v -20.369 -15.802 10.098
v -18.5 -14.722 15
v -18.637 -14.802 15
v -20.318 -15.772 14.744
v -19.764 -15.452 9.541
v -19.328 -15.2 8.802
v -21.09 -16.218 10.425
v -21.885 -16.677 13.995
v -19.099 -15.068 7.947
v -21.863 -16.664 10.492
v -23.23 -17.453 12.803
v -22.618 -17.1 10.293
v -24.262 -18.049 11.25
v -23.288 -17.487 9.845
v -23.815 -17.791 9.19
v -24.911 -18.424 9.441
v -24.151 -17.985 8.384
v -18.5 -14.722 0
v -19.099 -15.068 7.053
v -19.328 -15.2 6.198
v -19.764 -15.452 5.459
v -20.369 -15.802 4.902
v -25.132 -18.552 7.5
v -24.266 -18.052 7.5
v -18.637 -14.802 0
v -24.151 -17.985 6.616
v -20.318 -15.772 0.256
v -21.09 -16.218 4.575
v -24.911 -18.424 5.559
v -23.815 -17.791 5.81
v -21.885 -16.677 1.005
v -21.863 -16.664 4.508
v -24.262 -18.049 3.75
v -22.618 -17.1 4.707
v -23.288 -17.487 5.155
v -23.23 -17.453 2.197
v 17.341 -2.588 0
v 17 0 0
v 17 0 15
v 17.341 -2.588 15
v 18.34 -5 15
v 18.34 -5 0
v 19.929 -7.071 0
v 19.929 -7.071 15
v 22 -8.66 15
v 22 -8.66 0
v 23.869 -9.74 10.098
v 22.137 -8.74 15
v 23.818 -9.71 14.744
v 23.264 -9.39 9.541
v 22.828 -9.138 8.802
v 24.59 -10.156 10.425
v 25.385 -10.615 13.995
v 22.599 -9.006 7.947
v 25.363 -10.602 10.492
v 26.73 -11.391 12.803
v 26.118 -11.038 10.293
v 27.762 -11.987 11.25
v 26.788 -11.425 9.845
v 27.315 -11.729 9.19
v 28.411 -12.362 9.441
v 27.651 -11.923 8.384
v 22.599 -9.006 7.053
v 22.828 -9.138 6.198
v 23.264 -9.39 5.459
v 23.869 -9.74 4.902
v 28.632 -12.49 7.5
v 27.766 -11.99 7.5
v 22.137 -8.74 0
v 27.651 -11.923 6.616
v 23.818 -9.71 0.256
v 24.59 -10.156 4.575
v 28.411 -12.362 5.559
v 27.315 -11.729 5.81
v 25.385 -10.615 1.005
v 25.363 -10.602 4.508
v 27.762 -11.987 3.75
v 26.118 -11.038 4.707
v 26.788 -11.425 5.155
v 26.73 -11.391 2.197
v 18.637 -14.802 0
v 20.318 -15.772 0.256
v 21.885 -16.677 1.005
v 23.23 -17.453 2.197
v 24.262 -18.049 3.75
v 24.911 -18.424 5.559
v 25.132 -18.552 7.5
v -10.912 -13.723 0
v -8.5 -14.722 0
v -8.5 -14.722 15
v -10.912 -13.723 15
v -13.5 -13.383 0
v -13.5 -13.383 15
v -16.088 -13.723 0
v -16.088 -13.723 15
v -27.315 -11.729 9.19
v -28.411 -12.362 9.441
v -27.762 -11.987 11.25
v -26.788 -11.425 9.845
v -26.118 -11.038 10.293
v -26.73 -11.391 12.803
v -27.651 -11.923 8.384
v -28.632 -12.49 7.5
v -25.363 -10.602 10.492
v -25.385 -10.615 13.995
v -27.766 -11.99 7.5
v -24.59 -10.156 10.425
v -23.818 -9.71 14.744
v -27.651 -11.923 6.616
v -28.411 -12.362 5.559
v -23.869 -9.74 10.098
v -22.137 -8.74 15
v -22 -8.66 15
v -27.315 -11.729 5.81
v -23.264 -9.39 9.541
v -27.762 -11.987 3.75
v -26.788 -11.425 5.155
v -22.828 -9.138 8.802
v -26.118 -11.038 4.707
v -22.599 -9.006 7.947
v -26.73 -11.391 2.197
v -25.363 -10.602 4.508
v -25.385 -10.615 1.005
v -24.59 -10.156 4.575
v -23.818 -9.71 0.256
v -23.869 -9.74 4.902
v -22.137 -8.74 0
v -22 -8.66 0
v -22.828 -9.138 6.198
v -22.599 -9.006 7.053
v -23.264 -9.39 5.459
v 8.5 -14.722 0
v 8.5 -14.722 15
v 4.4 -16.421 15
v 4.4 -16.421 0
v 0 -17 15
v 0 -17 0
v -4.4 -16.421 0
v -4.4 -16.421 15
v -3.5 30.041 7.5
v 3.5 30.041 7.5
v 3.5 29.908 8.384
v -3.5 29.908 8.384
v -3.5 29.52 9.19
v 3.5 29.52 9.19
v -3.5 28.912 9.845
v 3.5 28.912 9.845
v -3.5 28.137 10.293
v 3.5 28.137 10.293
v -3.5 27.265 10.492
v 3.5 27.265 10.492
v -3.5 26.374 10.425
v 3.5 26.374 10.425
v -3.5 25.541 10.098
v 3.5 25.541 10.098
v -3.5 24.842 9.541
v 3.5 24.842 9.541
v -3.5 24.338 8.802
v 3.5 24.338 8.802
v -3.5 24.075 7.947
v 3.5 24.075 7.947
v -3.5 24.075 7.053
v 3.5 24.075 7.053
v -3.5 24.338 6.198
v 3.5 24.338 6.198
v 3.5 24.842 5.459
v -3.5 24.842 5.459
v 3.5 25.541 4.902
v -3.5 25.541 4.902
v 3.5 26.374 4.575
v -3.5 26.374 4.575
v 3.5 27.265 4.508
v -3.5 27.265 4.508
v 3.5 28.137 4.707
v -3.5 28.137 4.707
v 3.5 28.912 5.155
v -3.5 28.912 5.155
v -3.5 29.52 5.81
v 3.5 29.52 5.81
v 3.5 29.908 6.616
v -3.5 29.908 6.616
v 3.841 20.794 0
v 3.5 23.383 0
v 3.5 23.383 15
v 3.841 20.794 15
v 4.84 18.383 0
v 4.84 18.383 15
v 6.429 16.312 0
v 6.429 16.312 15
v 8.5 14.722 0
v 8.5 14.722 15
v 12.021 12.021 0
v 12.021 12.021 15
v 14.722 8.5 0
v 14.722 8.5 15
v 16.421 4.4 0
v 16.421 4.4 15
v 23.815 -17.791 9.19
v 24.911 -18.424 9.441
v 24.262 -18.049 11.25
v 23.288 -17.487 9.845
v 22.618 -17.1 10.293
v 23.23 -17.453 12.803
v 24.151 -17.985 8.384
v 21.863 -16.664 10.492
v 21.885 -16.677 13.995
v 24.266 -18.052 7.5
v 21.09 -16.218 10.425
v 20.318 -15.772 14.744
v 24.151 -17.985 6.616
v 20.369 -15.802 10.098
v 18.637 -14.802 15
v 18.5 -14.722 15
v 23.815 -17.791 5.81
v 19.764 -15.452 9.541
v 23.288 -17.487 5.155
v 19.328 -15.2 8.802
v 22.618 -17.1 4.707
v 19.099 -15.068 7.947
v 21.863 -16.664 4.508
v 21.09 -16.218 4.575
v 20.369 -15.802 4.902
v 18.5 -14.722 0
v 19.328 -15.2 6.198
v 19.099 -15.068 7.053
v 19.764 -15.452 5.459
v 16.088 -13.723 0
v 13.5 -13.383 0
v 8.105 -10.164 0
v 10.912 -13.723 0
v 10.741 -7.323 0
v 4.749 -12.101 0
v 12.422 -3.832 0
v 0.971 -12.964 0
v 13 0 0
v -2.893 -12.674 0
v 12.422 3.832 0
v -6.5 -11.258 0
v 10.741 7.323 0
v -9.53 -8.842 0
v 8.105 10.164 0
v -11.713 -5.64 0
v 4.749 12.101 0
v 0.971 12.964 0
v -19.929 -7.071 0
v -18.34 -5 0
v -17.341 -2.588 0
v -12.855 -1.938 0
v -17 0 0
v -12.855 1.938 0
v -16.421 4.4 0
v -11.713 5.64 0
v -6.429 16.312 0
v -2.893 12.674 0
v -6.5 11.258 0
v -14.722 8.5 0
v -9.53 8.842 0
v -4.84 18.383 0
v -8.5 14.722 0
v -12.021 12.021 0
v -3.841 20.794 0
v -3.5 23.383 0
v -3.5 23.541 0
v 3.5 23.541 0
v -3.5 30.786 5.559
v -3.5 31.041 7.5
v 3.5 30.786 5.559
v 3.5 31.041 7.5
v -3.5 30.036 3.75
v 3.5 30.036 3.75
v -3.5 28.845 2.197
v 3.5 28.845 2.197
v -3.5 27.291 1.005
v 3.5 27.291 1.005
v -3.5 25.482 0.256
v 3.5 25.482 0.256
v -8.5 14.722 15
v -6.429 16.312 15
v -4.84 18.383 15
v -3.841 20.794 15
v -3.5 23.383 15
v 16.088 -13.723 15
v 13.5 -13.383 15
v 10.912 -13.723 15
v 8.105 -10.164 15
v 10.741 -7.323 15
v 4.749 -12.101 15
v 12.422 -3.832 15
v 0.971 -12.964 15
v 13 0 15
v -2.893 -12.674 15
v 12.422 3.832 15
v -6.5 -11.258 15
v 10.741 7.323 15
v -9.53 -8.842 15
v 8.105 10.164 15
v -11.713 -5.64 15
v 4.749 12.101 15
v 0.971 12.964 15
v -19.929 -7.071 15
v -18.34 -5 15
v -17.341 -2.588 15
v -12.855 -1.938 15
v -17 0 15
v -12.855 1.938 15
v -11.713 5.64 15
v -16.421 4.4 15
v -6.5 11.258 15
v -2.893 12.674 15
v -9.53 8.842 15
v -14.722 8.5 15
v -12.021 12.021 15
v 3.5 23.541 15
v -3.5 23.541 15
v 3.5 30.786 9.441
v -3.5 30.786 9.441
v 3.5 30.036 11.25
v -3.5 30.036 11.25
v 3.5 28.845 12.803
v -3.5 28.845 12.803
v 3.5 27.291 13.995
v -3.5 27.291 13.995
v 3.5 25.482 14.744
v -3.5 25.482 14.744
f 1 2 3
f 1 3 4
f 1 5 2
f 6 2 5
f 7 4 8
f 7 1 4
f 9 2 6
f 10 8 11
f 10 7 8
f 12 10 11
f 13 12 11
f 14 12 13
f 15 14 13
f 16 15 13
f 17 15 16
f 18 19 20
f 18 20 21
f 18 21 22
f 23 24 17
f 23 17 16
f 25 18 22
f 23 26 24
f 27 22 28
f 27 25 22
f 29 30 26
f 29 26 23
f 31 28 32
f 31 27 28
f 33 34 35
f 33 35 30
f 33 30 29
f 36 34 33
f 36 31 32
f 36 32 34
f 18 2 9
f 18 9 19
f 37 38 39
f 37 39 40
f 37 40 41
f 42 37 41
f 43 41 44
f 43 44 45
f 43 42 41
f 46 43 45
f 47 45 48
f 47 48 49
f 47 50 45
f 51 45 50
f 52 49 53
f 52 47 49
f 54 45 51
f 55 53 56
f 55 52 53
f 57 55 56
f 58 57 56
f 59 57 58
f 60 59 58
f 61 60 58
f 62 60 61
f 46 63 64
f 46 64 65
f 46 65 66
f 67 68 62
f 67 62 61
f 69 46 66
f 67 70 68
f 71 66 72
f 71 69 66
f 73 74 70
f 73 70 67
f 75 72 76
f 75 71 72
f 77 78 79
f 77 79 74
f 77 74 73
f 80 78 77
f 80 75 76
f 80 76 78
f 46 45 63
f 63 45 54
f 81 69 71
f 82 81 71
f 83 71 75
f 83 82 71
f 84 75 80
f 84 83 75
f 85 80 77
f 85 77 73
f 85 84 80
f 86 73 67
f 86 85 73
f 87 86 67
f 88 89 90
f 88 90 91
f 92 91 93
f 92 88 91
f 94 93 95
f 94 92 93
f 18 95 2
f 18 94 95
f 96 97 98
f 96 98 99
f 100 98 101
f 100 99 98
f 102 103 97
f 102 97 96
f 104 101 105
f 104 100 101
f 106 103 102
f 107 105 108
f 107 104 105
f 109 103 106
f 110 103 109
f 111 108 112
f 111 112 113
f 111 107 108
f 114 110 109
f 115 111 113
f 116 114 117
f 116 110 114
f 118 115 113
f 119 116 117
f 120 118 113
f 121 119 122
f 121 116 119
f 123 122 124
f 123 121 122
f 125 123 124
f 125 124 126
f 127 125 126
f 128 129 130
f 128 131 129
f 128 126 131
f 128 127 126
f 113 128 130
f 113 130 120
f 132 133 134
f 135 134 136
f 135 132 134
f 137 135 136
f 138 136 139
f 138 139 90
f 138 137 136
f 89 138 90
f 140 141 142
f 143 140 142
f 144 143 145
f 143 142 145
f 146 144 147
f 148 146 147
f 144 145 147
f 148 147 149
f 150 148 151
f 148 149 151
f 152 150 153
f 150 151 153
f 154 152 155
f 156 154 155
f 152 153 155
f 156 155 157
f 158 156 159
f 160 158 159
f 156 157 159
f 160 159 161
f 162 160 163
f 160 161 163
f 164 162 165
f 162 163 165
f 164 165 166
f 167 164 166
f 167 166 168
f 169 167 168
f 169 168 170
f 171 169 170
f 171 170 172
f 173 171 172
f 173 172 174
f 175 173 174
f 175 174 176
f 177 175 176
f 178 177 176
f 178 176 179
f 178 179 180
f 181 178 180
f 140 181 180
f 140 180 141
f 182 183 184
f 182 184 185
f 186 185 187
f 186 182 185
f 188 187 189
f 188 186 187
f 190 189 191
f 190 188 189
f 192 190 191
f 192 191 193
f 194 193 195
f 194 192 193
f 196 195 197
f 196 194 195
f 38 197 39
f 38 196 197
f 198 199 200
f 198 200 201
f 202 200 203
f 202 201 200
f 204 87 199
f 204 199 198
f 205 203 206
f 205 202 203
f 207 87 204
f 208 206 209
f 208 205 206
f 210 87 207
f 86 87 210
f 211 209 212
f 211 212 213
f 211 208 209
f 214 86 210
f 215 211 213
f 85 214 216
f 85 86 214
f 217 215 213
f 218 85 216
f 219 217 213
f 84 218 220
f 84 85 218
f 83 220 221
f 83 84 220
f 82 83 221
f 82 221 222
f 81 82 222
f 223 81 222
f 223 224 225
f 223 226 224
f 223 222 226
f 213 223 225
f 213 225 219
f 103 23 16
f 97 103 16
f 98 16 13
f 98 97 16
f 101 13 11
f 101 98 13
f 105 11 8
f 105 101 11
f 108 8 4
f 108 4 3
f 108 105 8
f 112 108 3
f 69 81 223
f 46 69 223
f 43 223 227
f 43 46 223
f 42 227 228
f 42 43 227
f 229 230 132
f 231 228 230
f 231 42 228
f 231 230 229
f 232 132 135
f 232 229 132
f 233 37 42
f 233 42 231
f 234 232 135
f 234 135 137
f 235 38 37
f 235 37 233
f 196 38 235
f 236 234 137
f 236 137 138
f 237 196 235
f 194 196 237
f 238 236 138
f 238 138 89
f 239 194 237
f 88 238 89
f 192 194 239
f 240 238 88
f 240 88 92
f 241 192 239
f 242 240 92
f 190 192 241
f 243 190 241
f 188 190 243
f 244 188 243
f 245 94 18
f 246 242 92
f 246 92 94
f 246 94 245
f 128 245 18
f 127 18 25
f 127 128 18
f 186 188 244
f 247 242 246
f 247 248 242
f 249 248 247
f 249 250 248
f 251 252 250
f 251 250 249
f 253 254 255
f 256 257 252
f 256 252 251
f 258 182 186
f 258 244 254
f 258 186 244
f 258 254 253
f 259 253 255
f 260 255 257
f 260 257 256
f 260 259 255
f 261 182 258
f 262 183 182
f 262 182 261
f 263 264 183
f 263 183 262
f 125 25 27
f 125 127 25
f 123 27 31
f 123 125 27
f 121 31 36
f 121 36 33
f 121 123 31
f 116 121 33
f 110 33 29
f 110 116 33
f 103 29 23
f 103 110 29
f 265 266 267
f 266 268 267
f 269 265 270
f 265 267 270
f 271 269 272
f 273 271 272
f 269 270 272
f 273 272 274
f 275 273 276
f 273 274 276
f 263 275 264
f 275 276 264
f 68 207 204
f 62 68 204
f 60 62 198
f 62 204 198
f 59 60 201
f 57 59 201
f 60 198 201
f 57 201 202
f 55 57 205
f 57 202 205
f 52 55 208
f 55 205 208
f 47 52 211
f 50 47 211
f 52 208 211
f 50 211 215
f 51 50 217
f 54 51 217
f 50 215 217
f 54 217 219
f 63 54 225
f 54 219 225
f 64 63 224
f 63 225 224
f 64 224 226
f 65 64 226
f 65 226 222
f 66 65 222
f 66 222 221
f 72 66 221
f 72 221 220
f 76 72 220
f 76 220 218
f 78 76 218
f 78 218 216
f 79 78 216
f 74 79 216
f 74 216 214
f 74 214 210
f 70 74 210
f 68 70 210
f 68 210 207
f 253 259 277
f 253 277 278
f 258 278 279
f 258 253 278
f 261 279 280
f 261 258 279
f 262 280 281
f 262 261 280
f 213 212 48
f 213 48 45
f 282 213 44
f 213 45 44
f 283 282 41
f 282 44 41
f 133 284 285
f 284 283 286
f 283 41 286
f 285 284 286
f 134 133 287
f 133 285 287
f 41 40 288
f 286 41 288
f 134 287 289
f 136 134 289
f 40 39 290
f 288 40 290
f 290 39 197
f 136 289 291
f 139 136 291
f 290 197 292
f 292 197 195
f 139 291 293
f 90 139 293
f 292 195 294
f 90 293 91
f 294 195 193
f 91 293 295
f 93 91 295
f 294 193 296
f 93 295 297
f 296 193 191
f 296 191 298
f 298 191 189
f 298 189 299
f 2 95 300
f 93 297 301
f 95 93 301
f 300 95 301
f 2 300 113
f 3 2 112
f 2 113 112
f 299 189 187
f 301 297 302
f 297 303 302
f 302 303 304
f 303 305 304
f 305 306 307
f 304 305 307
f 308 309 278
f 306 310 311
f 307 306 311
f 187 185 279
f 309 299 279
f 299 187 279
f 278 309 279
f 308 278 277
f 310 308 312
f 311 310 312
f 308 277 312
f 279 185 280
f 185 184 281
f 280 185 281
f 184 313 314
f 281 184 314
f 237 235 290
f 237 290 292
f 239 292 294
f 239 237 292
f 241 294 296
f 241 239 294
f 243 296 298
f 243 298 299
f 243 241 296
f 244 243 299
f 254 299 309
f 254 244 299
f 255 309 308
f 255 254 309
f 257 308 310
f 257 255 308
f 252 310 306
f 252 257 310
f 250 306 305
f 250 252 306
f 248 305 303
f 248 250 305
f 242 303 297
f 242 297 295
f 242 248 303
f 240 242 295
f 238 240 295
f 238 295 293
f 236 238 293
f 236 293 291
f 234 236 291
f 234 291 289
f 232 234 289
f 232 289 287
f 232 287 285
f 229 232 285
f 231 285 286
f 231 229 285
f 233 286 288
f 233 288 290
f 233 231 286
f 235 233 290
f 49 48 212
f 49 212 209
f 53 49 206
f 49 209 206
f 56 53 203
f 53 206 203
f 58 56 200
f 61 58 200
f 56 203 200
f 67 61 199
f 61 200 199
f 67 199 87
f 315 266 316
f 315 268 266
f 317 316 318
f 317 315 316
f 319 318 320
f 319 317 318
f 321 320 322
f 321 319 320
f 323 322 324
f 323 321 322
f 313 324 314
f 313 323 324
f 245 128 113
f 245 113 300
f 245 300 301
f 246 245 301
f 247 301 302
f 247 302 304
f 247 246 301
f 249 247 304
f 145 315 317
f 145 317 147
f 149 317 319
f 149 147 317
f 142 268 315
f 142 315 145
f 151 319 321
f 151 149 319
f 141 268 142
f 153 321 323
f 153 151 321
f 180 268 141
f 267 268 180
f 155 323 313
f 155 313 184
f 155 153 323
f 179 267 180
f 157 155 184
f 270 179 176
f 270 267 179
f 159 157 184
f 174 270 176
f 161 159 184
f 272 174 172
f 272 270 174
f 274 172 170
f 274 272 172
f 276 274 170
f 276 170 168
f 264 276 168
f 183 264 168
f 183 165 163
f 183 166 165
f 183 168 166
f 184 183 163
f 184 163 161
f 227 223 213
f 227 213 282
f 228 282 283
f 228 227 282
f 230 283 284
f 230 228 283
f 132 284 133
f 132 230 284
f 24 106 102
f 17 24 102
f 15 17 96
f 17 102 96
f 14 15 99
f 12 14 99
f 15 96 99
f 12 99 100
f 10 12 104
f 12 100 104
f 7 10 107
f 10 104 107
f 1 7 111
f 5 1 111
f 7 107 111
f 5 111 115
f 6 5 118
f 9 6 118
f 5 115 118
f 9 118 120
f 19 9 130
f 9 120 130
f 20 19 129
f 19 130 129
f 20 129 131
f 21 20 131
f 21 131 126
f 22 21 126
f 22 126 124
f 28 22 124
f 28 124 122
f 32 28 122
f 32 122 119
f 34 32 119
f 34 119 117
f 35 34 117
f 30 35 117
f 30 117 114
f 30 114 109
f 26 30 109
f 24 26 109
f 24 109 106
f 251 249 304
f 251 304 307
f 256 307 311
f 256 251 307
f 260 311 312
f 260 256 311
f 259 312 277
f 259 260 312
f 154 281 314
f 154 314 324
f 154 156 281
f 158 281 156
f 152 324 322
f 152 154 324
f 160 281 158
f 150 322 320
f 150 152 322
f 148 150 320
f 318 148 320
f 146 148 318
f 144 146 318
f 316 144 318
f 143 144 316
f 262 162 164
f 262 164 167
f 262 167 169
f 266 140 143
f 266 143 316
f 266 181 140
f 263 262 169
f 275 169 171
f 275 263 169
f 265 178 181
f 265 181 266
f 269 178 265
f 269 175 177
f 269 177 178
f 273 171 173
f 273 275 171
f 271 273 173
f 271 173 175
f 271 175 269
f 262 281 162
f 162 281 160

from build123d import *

# Parameters (mm, degrees)
ESQUISSE1_R                  = 13
BOSS_EXTRU_1_DEPTH           = 15
CONG_1_R                     = 7.5
CONG_2_R                     = 7.5
CONG_3_R                     = 7.5
ENL_V_MAT_EXTRU_1_REACH      = 50.052
ESQUISSE2_R                  = 3
R_P_TITION_CIRCULAIRE1_COUNT = 3


with BuildPart() as part:
    # Esquisse1 → Boss.-Extru.1 (new body)
    with BuildSketch(Plane.XY):
        with BuildLine():
            Line((-3.5, 23.382685902), (-3.5, 31.041209697))
            Line((-3.5, 31.041209697), (3.5, 31.041209697))
            Line((3.5, 31.041209697), (3.5, 23.382685902))
            ThreePointArc((3.5, 23.382685902), (4.839745962, 18.382685902), (8.5, 14.722431864))
            ThreePointArc((8.5, 14.722431864), (14.722431864, 8.5), (17, 0))
            ThreePointArc((17, 0), (18.339745962, -5), (22, -8.660254038))
            Line((22, -8.660254038), (28.632476161, -12.489515935))
            Line((28.632476161, -12.489515935), (25.132476161, -18.551693762))
            Line((25.132476161, -18.551693762), (18.5, -14.722431864))
            ThreePointArc((18.5, -14.722431864), (13.5, -13.382685902), (8.5, -14.722431864))
            ThreePointArc((8.5, -14.722431864), (0, -17), (-8.5, -14.722431864))
            ThreePointArc((-8.5, -14.722431864), (-13.5, -13.382685902), (-18.5, -14.722431864))
            Line((-18.5, -14.722431864), (-25.132476161, -18.551693762))
            Line((-25.132476161, -18.551693762), (-28.632476161, -12.489515935))
            Line((-28.632476161, -12.489515935), (-22, -8.660254038))
            ThreePointArc((-22, -8.660254038), (-18.339745962, -5), (-17, 0))
            ThreePointArc((-17, 0), (-14.722431864, 8.5), (-8.5, 14.722431864))
            ThreePointArc((-8.5, 14.722431864), (-4.839745962, 18.382685902), (-3.5, 23.382685902))
        make_face()
        Circle(ESQUISSE1_R, mode=Mode.SUBTRACT)
    extrude(amount=BOSS_EXTRU_1_DEPTH)

    # Congé1
    cong_1_edges = [part.edges().sort_by_distance(p)[0] for p in [
        (0, 31.041209697, 0),
        (0, 31.041209697, 15),
    ]]
    fillet(cong_1_edges, radius=CONG_1_R - 0.0001)  # a hair under: the kernel refuses the full size

    # Congé2
    cong_2_edges = [part.edges().sort_by_distance(p)[0] for p in [
        (26.882476161, -15.520604848, 0),
        (26.882476161, -15.520604848, 15),
    ]]
    fillet(cong_2_edges, radius=CONG_2_R - 0.0001)  # a hair under: the kernel refuses the full size

    # Congé3
    cong_3_edges = [part.edges().sort_by_distance(p)[0] for p in [
        (-26.882476161, -15.520604848, 15),
        (-26.882476161, -15.520604848, 0),
    ]]
    fillet(cong_3_edges, radius=CONG_3_R - 0.0001)  # a hair under: the kernel refuses the full size

    # Esquisse2 → Enlèv. mat.-Extru.1 (cut, up to next)
    with BuildSketch(Plane(origin=(-1.75, -3.031088913, 0), x_dir=(0.8660254037844389, -0.4999999999999995, 0), z_dir=(-0.4999999999999995, -0.8660254037844389, 0)), mode=Mode.PRIVATE) as enl_v_mat_extru_1_sk1:
        with Locations((27.041209697, 7.5)):
            Circle(ESQUISSE2_R)
    enl_v_mat_extru_1_tool1 = extrude(enl_v_mat_extru_1_sk1.sketch, amount=-ENL_V_MAT_EXTRU_1_REACH, mode=Mode.PRIVATE) & part.part
    enl_v_mat_extru_1 = enl_v_mat_extru_1_tool1.solids().sort_by_distance((21.668375, -16.551694, 7.5))[0]
    add(enl_v_mat_extru_1, mode=Mode.SUBTRACT)

    # Répétition circulaire1: Enlèv. mat.-Extru.1 ×3 about axis
    r_p_tition_circulaire1_axis = Axis((0, 0, 15), (0, 0, -1))
    for i in range(1, R_P_TITION_CIRCULAIRE1_COUNT):
        add(enl_v_mat_extru_1.rotate(r_p_tition_circulaire1_axis, i * 360 / R_P_TITION_CIRCULAIRE1_COUNT), mode=Mode.SUBTRACT)


solid = part.part
